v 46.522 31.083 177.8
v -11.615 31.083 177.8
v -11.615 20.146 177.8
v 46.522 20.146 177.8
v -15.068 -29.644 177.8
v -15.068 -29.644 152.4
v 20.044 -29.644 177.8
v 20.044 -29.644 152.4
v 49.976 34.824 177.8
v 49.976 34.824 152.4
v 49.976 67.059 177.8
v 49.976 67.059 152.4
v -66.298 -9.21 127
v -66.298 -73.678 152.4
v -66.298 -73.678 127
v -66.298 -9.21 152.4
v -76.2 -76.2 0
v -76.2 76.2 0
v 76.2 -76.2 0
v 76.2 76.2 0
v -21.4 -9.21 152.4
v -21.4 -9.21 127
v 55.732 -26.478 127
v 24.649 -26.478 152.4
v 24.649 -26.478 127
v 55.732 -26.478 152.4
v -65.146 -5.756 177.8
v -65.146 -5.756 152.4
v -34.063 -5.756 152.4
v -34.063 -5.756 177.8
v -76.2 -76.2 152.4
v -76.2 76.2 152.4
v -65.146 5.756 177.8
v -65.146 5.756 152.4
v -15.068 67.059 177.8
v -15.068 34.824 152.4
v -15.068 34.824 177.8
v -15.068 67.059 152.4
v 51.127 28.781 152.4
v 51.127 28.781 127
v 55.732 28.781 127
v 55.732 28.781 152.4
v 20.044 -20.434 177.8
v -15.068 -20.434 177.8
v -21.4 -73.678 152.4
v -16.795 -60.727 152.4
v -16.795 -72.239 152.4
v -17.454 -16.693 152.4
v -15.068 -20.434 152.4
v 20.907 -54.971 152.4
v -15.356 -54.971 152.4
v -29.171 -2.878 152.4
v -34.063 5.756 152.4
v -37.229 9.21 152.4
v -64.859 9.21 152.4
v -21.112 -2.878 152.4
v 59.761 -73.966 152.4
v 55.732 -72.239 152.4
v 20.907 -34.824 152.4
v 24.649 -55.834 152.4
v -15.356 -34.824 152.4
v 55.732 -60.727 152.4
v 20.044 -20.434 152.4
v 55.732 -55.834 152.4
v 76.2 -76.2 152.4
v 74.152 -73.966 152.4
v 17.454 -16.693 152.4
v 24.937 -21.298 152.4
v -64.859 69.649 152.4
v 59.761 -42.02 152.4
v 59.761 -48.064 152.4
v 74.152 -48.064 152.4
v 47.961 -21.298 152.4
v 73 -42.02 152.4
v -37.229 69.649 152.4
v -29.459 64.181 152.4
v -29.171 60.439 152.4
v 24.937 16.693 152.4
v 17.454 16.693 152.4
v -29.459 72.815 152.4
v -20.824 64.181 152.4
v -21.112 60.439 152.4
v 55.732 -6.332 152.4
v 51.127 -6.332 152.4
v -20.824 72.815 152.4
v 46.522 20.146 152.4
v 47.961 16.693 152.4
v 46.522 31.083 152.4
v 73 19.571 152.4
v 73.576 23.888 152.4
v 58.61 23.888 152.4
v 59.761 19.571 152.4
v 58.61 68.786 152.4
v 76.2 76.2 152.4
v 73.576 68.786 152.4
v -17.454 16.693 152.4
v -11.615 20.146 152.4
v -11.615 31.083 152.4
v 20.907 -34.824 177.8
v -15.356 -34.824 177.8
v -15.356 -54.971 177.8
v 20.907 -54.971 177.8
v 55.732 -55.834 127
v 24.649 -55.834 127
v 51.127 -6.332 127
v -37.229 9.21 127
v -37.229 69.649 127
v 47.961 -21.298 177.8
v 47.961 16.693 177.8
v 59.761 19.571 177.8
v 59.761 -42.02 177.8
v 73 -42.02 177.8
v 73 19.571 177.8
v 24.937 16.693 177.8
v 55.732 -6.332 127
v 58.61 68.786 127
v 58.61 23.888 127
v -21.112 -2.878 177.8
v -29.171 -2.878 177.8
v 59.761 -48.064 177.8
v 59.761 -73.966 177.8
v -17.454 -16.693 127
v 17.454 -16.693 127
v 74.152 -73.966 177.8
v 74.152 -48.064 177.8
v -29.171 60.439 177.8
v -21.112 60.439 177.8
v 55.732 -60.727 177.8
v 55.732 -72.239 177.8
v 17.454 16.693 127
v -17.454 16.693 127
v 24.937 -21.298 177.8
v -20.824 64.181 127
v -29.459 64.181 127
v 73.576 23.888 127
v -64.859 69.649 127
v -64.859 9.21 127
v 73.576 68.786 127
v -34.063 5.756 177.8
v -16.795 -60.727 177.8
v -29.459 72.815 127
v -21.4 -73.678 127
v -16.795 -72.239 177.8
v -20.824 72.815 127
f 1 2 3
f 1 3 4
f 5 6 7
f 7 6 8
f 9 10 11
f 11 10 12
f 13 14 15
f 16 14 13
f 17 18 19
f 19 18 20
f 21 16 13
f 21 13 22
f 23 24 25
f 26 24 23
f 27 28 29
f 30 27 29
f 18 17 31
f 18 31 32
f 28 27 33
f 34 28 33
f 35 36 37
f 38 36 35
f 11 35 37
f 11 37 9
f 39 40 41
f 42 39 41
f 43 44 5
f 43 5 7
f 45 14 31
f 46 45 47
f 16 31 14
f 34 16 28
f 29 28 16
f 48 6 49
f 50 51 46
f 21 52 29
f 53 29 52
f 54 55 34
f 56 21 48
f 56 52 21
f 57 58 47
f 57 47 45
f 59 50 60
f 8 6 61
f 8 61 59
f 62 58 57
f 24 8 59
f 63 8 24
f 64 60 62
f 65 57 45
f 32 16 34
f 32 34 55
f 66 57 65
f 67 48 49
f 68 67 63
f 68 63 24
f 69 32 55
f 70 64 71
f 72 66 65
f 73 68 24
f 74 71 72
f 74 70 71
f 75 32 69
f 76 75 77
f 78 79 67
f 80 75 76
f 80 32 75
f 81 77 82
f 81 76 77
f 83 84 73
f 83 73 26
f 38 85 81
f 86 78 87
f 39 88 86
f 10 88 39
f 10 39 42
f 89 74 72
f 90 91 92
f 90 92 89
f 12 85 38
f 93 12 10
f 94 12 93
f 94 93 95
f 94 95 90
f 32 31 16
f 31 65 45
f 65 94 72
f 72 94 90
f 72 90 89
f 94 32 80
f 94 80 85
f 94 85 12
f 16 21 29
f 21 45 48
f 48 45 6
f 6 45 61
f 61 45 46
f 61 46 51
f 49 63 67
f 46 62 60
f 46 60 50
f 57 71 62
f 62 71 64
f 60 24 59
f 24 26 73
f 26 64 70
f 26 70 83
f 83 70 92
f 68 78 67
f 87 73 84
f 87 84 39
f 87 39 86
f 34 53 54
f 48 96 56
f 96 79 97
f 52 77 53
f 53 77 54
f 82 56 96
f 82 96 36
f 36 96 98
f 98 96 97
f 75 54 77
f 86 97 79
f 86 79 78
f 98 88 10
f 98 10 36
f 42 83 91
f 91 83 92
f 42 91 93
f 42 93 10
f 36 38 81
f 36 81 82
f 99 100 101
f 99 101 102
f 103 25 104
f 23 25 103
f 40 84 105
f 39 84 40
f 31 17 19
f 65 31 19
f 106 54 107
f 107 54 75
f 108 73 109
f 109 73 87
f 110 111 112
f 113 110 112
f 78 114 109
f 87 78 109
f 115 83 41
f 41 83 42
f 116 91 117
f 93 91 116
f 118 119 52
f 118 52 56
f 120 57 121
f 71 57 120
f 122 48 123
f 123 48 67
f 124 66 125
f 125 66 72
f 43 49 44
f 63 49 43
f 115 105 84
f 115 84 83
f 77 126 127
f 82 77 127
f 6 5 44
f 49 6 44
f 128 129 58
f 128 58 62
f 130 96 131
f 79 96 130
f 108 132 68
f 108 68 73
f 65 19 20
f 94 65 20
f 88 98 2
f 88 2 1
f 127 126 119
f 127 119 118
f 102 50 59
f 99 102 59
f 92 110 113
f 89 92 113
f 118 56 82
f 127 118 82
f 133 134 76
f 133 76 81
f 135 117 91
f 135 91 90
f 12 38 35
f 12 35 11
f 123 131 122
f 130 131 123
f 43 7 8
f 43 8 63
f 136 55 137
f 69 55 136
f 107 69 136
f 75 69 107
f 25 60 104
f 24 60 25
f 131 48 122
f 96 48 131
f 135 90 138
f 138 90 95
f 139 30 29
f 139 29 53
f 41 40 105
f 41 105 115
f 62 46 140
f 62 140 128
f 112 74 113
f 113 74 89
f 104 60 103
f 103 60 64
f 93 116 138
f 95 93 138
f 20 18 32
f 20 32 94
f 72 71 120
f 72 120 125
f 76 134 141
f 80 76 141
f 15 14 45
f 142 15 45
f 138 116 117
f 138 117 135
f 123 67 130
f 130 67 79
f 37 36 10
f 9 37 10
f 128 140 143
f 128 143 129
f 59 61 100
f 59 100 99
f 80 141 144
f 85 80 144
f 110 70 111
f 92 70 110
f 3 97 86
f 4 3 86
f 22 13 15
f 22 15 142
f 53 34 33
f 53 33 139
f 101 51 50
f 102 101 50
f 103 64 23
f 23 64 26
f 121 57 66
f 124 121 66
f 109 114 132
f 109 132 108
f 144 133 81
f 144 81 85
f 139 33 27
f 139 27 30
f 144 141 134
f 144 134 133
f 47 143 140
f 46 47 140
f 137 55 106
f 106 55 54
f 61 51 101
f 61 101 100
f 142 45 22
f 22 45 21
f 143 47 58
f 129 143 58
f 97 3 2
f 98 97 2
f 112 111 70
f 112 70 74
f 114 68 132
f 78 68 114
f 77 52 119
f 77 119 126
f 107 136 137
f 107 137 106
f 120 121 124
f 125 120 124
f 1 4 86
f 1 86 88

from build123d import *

# Parameters (mm, degrees)
F0_W     = 152.4
F0_H     = 152.4
F1_DEPTH = 152.4
F2_W     = 34.9075235426
F2_H     = 33.3854667842
F2_W_2   = 35.112304613
F2_H_2   = 9.2097893357
F2_W_3   = 58.1367611885
F2_H_3   = 10.9366215765
F2_W_4   = 8.0585666001
F2_H_4   = 63.3172709495
F2_W_5   = 44.897697866
F2_H_5   = 64.4684825093
F2_W_6   = 27.629353106
F2_H_6   = 60.4392085224
F2_W_7   = 31.0830175877
F2_H_7   = 11.5122310817
F2_W_8   = 65.0440976024
F2_H_8   = 32.2342440486
F2_W_9   = 8.6341686547
F2_H_9   = 8.6341649294
F2_W_10  = 14.9659141898
F2_H_10  = 44.8977053165
F2_W_11  = 4.6048909426
F2_H_11  = 35.1123064756
F2_W_12  = 23.0244547129
F2_H_12  = 37.9903591238
F2_W_13  = 13.239055872
F2_H_13  = 61.5904331207
F2_W_14  = 31.0830101371
F2_H_14  = 29.3561927974
F2_W_15  = 14.3903046846
F2_H_15  = 25.9025096893
F2_W_16  = 72.5270435214
F2_H_16  = 11.5122199059
F2_W_17  = 36.2635287456
F2_H_17  = 20.1463997364
F3_DEPTH = 25.4
F4_DEPTH = 50.8


with BuildPart() as f1:
    # F0 (on Top) → F1 (new body)
    with BuildSketch(Plane.XY):
        Rectangle(F0_W, F0_H)
    extrude(amount=F1_DEPTH)

    # F2 (on face) → F3 (join)
    with BuildSketch(Plane.XY.offset(152.4)):
        Rectangle(F2_W, F2_H)
        with Locations((2.4878596887, -25.0390991569)):
            Rectangle(F2_W_2, F2_H_2)
        with Locations((17.4537617713, 25.6147123873)):
            Rectangle(F2_W_3, F2_H_3)
        with Locations((-25.1414887607, 28.7805777043)):
            Rectangle(F2_W_4, F2_H_4)
        with Locations((-43.8488647342, -41.4440259337)):
            Rectangle(F2_W_5, F2_H_5)
        with Locations((-51.0440096259, 39.4293889403)):
            Rectangle(F2_W_6, F2_H_6)
        with Locations((-49.6049784124, 0)):
            Rectangle(F2_W_7, F2_H_7)
        with Locations((17.4537617713, 50.9416200221)):
            Rectangle(F2_W_8, F2_H_8)
        with Locations((-25.1414887607, 68.4977695346)):
            Rectangle(F2_W_9, F2_H_9)
        with Locations((66.0929381847, 46.3367253542)):
            Rectangle(F2_W_10, F2_H_10)
        with Locations((53.4294769168, 11.2244244665)):
            Rectangle(F2_W_11, F2_H_11)
        with Locations((36.44894436, -2.3024461698)):
            Rectangle(F2_W_12, F2_H_12)
        with Locations((66.3807466626, -11.2244244665)):
            Rectangle(F2_W_13, F2_H_13)
        with Locations((40.1904173195, -41.1562249064)):
            Rectangle(F2_W_14, F2_H_14)
        with Locations((66.9563561678, -61.0148198903)):
            Rectangle(F2_W_15, F2_H_15)
        with Locations((19.4684006274, -66.4831325412)):
            Rectangle(F2_W_16, F2_H_16)
        with Locations((2.7756656054, -44.897697866)):
            Rectangle(F2_W_17, F2_H_17)
    extrude(amount=F3_DEPTH)

    # F4 (cut): faces of the model
    f4_faces = [f1.faces().sort_by_distance(p)[0] for p in [
        (-51.0440096259, 39.4293889403, 177.8),
        (0, 0, 177.8),
        (40.1904173195, -41.1562249064, 177.8),
        (-43.8488647342, -41.4440259337, 177.8),
        (66.0929381847, 46.3367253542, 177.8),
        (-25.1414887607, 68.4977695346, 177.8),
        (53.4294769168, 11.2244244665, 177.8),
    ]]
    extrude(f4_faces, amount=-F4_DEPTH, mode=Mode.SUBTRACT)


solid = f1.part
